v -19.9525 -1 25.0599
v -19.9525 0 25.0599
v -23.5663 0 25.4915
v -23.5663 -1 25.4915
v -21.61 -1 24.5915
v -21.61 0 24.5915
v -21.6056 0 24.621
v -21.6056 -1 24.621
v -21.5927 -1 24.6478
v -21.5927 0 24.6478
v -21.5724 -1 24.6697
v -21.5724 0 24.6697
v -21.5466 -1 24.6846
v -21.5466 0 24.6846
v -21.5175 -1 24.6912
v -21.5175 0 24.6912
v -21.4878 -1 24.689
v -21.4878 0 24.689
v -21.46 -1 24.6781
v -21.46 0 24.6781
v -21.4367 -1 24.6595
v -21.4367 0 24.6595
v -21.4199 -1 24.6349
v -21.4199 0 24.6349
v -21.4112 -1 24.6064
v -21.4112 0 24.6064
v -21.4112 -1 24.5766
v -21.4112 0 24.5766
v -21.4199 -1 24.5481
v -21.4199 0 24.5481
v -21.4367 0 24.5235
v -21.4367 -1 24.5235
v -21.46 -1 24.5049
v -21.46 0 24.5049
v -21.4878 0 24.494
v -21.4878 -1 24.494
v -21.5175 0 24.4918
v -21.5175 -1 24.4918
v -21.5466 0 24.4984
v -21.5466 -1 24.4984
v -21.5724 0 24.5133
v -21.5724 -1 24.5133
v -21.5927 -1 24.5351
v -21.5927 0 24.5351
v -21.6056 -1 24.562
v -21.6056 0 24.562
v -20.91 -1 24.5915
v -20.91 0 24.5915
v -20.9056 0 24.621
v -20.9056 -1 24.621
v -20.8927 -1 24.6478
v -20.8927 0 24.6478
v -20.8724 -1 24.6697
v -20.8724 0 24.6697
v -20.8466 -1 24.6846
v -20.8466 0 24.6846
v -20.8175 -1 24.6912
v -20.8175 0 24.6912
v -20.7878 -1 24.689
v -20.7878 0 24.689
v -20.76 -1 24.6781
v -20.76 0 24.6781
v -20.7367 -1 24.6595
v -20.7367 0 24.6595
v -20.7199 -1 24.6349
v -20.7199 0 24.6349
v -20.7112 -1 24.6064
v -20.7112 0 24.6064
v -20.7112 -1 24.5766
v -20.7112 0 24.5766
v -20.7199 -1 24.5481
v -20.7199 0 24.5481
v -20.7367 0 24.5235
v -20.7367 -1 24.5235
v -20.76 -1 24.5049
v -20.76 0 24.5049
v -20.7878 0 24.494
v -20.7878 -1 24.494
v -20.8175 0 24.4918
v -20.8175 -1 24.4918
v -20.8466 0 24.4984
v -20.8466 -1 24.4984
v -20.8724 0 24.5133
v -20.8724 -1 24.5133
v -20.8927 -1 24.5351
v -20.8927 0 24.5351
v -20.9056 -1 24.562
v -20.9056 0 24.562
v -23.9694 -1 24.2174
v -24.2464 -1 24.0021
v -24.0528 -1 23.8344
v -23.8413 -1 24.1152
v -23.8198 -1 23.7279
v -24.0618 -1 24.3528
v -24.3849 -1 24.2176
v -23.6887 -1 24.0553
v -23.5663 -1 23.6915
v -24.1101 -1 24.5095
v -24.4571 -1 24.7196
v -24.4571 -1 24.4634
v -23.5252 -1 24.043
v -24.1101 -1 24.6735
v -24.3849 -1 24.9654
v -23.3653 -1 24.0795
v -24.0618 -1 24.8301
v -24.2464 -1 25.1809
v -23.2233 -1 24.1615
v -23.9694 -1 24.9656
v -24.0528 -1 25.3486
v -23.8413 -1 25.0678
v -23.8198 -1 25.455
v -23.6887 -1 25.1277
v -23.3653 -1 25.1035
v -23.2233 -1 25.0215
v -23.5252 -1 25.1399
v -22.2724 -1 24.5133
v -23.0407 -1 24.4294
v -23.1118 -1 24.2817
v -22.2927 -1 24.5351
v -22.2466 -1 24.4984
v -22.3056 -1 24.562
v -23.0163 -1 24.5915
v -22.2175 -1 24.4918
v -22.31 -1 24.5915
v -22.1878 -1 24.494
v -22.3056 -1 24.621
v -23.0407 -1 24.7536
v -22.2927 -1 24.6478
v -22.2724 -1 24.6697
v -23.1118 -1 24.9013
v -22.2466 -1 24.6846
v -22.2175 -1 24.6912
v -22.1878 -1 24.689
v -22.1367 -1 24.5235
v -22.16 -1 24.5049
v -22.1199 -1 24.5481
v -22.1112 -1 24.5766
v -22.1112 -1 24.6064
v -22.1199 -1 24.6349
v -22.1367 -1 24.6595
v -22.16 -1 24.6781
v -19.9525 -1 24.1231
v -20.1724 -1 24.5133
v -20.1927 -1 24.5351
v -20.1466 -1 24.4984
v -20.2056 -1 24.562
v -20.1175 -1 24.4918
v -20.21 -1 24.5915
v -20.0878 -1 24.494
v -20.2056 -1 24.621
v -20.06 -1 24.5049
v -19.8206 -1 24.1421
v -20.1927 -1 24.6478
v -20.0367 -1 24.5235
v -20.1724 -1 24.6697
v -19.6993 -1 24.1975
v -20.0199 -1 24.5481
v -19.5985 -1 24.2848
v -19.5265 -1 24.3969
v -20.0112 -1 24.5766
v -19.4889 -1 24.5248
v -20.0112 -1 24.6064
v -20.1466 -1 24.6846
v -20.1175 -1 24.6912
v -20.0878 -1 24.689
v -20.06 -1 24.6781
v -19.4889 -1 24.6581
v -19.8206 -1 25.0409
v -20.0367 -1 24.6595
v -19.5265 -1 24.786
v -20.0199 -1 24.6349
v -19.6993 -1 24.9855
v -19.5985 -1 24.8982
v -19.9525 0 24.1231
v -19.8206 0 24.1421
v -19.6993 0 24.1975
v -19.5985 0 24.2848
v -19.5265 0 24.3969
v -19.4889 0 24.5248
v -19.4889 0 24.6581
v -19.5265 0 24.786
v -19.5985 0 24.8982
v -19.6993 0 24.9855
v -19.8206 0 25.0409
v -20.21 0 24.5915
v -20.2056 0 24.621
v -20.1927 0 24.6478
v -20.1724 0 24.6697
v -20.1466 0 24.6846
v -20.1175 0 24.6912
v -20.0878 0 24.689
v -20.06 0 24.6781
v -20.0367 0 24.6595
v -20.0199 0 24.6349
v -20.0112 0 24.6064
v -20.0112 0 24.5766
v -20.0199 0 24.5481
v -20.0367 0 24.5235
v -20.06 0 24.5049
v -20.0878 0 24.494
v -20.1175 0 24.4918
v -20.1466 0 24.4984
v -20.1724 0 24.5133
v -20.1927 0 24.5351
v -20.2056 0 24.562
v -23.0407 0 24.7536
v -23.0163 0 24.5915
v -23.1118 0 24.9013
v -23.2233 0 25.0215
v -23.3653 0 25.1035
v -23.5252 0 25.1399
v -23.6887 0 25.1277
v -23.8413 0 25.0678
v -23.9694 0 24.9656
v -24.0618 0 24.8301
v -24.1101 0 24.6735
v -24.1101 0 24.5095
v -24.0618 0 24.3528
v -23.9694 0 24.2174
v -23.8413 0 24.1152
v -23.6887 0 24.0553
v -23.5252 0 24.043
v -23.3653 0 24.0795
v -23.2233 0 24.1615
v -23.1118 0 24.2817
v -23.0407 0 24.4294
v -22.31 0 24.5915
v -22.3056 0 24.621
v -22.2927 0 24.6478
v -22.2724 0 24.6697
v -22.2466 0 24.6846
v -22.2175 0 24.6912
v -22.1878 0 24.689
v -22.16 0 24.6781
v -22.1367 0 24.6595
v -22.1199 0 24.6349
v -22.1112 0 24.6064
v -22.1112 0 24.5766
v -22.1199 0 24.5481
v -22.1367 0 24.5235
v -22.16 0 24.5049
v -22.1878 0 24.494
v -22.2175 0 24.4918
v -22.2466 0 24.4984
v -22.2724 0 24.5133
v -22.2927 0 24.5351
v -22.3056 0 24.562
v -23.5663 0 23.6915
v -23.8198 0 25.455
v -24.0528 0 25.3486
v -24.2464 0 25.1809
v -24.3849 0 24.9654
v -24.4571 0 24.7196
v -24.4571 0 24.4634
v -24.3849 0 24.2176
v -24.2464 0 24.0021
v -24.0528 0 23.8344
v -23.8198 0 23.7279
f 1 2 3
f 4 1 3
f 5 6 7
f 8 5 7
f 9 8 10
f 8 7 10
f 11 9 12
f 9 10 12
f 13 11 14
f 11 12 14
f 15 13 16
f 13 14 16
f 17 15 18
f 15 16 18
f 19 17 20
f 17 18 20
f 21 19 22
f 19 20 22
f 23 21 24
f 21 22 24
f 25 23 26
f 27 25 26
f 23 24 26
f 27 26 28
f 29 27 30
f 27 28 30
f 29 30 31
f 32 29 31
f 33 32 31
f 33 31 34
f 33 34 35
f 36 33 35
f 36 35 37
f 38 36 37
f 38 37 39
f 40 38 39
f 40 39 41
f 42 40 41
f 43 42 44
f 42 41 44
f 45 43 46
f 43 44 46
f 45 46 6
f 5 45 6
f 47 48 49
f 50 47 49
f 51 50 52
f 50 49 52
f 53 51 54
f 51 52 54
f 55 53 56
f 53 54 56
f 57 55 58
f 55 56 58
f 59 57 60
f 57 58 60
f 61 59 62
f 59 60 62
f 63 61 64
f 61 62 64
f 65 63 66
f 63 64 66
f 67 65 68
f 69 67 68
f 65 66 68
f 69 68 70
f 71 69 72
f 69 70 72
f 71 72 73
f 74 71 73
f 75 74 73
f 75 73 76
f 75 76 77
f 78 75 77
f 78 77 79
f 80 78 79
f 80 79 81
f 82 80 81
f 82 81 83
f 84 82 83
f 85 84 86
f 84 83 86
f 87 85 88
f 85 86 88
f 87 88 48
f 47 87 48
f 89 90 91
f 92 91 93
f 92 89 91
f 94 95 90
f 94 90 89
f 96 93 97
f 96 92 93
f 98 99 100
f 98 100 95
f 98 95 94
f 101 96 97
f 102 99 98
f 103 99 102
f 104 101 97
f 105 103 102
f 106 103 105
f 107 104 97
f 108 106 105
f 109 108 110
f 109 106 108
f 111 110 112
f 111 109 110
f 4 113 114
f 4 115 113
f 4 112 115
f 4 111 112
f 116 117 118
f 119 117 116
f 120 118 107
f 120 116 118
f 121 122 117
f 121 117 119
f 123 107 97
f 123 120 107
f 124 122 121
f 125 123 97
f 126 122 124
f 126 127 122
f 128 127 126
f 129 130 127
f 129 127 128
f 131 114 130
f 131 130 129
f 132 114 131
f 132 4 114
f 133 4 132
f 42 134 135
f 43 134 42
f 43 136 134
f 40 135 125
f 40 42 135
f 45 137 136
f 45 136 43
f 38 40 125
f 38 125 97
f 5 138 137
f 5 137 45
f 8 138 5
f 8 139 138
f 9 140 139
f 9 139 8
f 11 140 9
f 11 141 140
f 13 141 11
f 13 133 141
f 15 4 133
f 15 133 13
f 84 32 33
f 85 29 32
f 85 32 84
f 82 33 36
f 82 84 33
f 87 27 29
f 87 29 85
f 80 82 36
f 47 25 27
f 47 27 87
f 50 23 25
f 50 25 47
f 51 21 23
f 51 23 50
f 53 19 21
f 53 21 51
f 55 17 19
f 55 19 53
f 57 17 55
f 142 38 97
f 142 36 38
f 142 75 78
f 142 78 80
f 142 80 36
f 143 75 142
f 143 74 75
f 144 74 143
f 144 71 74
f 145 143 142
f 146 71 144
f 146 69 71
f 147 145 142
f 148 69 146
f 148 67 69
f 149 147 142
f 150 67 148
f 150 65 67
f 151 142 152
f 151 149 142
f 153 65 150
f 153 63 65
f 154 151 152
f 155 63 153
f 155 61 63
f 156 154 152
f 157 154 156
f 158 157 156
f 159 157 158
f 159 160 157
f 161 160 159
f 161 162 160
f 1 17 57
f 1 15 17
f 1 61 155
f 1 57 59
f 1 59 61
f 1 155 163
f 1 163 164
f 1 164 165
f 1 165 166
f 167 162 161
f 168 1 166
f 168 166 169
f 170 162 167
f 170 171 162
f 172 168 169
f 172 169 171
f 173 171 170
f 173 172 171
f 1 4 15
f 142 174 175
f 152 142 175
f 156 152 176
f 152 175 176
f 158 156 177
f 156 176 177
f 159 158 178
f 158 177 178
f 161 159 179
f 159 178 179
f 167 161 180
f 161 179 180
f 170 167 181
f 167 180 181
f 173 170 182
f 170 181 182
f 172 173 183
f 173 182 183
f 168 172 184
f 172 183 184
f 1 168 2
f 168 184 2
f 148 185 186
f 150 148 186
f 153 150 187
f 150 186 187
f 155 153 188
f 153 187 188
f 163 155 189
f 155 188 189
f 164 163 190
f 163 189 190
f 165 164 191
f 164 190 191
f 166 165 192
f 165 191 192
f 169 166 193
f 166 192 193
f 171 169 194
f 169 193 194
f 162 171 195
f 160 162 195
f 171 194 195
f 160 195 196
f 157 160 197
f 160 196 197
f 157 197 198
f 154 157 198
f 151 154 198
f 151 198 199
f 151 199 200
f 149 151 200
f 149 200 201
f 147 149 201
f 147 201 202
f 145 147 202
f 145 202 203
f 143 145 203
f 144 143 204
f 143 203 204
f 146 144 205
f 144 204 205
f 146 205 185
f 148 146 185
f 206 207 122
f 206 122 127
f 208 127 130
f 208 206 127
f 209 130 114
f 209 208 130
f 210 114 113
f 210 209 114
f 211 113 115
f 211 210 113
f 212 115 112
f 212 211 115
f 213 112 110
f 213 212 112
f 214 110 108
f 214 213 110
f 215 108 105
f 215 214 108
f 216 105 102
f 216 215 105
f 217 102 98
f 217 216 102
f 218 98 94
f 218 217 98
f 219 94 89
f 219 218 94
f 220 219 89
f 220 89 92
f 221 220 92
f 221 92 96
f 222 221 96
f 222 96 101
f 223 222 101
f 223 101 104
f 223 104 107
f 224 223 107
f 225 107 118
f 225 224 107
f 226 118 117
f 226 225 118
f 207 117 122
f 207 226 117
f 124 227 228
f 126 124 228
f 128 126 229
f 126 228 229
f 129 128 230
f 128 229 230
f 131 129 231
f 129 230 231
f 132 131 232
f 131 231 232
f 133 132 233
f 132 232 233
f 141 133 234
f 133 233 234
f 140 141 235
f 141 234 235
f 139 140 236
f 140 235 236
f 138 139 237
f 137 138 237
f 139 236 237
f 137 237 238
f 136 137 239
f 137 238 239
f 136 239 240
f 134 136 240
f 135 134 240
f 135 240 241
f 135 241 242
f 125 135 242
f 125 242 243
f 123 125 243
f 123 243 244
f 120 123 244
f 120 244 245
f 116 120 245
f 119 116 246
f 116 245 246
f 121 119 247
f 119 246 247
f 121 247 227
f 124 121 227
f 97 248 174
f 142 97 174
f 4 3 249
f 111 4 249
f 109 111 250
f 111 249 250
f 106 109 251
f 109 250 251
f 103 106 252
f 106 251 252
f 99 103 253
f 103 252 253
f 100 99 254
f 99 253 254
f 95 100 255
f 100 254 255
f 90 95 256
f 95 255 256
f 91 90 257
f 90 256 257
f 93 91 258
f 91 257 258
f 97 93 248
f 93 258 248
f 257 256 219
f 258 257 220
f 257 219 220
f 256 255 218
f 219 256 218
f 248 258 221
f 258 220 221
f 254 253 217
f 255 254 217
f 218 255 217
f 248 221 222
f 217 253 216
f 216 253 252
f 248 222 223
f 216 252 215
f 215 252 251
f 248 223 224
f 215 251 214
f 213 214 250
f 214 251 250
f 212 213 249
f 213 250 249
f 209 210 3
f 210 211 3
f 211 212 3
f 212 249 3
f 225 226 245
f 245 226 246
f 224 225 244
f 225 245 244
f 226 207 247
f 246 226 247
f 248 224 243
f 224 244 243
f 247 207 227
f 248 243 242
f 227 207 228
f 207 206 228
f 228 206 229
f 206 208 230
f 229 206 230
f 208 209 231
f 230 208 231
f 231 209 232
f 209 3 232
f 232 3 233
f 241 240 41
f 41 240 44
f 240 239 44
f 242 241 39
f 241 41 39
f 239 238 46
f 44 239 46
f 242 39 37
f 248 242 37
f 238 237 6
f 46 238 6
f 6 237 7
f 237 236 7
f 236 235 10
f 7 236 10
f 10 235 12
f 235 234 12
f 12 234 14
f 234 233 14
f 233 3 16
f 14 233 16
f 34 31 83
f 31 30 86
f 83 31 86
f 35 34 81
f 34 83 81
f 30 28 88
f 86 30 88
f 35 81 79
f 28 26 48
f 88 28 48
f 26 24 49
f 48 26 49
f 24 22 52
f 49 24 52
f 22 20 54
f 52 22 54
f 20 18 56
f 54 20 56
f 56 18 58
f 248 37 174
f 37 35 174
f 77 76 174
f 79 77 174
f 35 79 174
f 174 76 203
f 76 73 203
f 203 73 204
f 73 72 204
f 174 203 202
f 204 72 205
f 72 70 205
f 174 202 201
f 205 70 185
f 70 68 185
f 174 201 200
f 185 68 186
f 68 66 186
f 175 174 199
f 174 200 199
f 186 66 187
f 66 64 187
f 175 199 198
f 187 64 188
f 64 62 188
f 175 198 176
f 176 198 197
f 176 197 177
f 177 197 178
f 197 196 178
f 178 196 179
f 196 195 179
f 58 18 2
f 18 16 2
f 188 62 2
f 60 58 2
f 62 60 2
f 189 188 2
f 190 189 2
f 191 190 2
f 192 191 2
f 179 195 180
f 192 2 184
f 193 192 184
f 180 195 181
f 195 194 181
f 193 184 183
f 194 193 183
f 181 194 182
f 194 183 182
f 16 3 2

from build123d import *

# Parameters (mm, degrees)
F0_R     = 0.55
F1_DEPTH = 1


with BuildPart() as f1:
    # F0 (on Front) → F1 (new body)
    with BuildSketch(Plane.XZ):
        with BuildLine():
            Line((-19.952511, 25.059854), (-23.566264, 25.491481))
            ThreePointArc((-23.566264, 25.491481), (-24.466264, 24.591481), (-23.566264, 23.691481))
            Line((-23.566264, 23.691481), (-19.952511, 24.123108))
            ThreePointArc((-19.952511, 24.123108), (-19.484139, 24.591481), (-19.952511, 25.059854))
        make_face()
        with Locations((-23.566264, 24.591481)):
            Circle(F0_R, mode=Mode.SUBTRACT)
        with BuildLine():
            ThreePointArc((-22.110037, 24.591481), (-22.210037, 24.491481), (-22.310037, 24.591481))
            ThreePointArc((-22.310037, 24.591481), (-22.210037, 24.691481), (-22.110037, 24.591481))
        make_face(mode=Mode.SUBTRACT)
        with BuildLine():
            ThreePointArc((-21.410037, 24.591481), (-21.510037, 24.491481), (-21.610037, 24.591481))
            ThreePointArc((-21.610037, 24.591481), (-21.510037, 24.691481), (-21.410037, 24.591481))
        make_face(mode=Mode.SUBTRACT)
        with BuildLine():
            ThreePointArc((-20.710037, 24.591481), (-20.810037, 24.491481), (-20.910037, 24.591481))
            ThreePointArc((-20.910037, 24.591481), (-20.810037, 24.691481), (-20.710037, 24.591481))
        make_face(mode=Mode.SUBTRACT)
        with BuildLine():
            ThreePointArc((-20.010037, 24.591481), (-20.110037, 24.491481), (-20.210037, 24.591481))
            ThreePointArc((-20.210037, 24.591481), (-20.110037, 24.691481), (-20.010037, 24.591481))
        make_face(mode=Mode.SUBTRACT)
    extrude(amount=F1_DEPTH)


solid = f1.part
